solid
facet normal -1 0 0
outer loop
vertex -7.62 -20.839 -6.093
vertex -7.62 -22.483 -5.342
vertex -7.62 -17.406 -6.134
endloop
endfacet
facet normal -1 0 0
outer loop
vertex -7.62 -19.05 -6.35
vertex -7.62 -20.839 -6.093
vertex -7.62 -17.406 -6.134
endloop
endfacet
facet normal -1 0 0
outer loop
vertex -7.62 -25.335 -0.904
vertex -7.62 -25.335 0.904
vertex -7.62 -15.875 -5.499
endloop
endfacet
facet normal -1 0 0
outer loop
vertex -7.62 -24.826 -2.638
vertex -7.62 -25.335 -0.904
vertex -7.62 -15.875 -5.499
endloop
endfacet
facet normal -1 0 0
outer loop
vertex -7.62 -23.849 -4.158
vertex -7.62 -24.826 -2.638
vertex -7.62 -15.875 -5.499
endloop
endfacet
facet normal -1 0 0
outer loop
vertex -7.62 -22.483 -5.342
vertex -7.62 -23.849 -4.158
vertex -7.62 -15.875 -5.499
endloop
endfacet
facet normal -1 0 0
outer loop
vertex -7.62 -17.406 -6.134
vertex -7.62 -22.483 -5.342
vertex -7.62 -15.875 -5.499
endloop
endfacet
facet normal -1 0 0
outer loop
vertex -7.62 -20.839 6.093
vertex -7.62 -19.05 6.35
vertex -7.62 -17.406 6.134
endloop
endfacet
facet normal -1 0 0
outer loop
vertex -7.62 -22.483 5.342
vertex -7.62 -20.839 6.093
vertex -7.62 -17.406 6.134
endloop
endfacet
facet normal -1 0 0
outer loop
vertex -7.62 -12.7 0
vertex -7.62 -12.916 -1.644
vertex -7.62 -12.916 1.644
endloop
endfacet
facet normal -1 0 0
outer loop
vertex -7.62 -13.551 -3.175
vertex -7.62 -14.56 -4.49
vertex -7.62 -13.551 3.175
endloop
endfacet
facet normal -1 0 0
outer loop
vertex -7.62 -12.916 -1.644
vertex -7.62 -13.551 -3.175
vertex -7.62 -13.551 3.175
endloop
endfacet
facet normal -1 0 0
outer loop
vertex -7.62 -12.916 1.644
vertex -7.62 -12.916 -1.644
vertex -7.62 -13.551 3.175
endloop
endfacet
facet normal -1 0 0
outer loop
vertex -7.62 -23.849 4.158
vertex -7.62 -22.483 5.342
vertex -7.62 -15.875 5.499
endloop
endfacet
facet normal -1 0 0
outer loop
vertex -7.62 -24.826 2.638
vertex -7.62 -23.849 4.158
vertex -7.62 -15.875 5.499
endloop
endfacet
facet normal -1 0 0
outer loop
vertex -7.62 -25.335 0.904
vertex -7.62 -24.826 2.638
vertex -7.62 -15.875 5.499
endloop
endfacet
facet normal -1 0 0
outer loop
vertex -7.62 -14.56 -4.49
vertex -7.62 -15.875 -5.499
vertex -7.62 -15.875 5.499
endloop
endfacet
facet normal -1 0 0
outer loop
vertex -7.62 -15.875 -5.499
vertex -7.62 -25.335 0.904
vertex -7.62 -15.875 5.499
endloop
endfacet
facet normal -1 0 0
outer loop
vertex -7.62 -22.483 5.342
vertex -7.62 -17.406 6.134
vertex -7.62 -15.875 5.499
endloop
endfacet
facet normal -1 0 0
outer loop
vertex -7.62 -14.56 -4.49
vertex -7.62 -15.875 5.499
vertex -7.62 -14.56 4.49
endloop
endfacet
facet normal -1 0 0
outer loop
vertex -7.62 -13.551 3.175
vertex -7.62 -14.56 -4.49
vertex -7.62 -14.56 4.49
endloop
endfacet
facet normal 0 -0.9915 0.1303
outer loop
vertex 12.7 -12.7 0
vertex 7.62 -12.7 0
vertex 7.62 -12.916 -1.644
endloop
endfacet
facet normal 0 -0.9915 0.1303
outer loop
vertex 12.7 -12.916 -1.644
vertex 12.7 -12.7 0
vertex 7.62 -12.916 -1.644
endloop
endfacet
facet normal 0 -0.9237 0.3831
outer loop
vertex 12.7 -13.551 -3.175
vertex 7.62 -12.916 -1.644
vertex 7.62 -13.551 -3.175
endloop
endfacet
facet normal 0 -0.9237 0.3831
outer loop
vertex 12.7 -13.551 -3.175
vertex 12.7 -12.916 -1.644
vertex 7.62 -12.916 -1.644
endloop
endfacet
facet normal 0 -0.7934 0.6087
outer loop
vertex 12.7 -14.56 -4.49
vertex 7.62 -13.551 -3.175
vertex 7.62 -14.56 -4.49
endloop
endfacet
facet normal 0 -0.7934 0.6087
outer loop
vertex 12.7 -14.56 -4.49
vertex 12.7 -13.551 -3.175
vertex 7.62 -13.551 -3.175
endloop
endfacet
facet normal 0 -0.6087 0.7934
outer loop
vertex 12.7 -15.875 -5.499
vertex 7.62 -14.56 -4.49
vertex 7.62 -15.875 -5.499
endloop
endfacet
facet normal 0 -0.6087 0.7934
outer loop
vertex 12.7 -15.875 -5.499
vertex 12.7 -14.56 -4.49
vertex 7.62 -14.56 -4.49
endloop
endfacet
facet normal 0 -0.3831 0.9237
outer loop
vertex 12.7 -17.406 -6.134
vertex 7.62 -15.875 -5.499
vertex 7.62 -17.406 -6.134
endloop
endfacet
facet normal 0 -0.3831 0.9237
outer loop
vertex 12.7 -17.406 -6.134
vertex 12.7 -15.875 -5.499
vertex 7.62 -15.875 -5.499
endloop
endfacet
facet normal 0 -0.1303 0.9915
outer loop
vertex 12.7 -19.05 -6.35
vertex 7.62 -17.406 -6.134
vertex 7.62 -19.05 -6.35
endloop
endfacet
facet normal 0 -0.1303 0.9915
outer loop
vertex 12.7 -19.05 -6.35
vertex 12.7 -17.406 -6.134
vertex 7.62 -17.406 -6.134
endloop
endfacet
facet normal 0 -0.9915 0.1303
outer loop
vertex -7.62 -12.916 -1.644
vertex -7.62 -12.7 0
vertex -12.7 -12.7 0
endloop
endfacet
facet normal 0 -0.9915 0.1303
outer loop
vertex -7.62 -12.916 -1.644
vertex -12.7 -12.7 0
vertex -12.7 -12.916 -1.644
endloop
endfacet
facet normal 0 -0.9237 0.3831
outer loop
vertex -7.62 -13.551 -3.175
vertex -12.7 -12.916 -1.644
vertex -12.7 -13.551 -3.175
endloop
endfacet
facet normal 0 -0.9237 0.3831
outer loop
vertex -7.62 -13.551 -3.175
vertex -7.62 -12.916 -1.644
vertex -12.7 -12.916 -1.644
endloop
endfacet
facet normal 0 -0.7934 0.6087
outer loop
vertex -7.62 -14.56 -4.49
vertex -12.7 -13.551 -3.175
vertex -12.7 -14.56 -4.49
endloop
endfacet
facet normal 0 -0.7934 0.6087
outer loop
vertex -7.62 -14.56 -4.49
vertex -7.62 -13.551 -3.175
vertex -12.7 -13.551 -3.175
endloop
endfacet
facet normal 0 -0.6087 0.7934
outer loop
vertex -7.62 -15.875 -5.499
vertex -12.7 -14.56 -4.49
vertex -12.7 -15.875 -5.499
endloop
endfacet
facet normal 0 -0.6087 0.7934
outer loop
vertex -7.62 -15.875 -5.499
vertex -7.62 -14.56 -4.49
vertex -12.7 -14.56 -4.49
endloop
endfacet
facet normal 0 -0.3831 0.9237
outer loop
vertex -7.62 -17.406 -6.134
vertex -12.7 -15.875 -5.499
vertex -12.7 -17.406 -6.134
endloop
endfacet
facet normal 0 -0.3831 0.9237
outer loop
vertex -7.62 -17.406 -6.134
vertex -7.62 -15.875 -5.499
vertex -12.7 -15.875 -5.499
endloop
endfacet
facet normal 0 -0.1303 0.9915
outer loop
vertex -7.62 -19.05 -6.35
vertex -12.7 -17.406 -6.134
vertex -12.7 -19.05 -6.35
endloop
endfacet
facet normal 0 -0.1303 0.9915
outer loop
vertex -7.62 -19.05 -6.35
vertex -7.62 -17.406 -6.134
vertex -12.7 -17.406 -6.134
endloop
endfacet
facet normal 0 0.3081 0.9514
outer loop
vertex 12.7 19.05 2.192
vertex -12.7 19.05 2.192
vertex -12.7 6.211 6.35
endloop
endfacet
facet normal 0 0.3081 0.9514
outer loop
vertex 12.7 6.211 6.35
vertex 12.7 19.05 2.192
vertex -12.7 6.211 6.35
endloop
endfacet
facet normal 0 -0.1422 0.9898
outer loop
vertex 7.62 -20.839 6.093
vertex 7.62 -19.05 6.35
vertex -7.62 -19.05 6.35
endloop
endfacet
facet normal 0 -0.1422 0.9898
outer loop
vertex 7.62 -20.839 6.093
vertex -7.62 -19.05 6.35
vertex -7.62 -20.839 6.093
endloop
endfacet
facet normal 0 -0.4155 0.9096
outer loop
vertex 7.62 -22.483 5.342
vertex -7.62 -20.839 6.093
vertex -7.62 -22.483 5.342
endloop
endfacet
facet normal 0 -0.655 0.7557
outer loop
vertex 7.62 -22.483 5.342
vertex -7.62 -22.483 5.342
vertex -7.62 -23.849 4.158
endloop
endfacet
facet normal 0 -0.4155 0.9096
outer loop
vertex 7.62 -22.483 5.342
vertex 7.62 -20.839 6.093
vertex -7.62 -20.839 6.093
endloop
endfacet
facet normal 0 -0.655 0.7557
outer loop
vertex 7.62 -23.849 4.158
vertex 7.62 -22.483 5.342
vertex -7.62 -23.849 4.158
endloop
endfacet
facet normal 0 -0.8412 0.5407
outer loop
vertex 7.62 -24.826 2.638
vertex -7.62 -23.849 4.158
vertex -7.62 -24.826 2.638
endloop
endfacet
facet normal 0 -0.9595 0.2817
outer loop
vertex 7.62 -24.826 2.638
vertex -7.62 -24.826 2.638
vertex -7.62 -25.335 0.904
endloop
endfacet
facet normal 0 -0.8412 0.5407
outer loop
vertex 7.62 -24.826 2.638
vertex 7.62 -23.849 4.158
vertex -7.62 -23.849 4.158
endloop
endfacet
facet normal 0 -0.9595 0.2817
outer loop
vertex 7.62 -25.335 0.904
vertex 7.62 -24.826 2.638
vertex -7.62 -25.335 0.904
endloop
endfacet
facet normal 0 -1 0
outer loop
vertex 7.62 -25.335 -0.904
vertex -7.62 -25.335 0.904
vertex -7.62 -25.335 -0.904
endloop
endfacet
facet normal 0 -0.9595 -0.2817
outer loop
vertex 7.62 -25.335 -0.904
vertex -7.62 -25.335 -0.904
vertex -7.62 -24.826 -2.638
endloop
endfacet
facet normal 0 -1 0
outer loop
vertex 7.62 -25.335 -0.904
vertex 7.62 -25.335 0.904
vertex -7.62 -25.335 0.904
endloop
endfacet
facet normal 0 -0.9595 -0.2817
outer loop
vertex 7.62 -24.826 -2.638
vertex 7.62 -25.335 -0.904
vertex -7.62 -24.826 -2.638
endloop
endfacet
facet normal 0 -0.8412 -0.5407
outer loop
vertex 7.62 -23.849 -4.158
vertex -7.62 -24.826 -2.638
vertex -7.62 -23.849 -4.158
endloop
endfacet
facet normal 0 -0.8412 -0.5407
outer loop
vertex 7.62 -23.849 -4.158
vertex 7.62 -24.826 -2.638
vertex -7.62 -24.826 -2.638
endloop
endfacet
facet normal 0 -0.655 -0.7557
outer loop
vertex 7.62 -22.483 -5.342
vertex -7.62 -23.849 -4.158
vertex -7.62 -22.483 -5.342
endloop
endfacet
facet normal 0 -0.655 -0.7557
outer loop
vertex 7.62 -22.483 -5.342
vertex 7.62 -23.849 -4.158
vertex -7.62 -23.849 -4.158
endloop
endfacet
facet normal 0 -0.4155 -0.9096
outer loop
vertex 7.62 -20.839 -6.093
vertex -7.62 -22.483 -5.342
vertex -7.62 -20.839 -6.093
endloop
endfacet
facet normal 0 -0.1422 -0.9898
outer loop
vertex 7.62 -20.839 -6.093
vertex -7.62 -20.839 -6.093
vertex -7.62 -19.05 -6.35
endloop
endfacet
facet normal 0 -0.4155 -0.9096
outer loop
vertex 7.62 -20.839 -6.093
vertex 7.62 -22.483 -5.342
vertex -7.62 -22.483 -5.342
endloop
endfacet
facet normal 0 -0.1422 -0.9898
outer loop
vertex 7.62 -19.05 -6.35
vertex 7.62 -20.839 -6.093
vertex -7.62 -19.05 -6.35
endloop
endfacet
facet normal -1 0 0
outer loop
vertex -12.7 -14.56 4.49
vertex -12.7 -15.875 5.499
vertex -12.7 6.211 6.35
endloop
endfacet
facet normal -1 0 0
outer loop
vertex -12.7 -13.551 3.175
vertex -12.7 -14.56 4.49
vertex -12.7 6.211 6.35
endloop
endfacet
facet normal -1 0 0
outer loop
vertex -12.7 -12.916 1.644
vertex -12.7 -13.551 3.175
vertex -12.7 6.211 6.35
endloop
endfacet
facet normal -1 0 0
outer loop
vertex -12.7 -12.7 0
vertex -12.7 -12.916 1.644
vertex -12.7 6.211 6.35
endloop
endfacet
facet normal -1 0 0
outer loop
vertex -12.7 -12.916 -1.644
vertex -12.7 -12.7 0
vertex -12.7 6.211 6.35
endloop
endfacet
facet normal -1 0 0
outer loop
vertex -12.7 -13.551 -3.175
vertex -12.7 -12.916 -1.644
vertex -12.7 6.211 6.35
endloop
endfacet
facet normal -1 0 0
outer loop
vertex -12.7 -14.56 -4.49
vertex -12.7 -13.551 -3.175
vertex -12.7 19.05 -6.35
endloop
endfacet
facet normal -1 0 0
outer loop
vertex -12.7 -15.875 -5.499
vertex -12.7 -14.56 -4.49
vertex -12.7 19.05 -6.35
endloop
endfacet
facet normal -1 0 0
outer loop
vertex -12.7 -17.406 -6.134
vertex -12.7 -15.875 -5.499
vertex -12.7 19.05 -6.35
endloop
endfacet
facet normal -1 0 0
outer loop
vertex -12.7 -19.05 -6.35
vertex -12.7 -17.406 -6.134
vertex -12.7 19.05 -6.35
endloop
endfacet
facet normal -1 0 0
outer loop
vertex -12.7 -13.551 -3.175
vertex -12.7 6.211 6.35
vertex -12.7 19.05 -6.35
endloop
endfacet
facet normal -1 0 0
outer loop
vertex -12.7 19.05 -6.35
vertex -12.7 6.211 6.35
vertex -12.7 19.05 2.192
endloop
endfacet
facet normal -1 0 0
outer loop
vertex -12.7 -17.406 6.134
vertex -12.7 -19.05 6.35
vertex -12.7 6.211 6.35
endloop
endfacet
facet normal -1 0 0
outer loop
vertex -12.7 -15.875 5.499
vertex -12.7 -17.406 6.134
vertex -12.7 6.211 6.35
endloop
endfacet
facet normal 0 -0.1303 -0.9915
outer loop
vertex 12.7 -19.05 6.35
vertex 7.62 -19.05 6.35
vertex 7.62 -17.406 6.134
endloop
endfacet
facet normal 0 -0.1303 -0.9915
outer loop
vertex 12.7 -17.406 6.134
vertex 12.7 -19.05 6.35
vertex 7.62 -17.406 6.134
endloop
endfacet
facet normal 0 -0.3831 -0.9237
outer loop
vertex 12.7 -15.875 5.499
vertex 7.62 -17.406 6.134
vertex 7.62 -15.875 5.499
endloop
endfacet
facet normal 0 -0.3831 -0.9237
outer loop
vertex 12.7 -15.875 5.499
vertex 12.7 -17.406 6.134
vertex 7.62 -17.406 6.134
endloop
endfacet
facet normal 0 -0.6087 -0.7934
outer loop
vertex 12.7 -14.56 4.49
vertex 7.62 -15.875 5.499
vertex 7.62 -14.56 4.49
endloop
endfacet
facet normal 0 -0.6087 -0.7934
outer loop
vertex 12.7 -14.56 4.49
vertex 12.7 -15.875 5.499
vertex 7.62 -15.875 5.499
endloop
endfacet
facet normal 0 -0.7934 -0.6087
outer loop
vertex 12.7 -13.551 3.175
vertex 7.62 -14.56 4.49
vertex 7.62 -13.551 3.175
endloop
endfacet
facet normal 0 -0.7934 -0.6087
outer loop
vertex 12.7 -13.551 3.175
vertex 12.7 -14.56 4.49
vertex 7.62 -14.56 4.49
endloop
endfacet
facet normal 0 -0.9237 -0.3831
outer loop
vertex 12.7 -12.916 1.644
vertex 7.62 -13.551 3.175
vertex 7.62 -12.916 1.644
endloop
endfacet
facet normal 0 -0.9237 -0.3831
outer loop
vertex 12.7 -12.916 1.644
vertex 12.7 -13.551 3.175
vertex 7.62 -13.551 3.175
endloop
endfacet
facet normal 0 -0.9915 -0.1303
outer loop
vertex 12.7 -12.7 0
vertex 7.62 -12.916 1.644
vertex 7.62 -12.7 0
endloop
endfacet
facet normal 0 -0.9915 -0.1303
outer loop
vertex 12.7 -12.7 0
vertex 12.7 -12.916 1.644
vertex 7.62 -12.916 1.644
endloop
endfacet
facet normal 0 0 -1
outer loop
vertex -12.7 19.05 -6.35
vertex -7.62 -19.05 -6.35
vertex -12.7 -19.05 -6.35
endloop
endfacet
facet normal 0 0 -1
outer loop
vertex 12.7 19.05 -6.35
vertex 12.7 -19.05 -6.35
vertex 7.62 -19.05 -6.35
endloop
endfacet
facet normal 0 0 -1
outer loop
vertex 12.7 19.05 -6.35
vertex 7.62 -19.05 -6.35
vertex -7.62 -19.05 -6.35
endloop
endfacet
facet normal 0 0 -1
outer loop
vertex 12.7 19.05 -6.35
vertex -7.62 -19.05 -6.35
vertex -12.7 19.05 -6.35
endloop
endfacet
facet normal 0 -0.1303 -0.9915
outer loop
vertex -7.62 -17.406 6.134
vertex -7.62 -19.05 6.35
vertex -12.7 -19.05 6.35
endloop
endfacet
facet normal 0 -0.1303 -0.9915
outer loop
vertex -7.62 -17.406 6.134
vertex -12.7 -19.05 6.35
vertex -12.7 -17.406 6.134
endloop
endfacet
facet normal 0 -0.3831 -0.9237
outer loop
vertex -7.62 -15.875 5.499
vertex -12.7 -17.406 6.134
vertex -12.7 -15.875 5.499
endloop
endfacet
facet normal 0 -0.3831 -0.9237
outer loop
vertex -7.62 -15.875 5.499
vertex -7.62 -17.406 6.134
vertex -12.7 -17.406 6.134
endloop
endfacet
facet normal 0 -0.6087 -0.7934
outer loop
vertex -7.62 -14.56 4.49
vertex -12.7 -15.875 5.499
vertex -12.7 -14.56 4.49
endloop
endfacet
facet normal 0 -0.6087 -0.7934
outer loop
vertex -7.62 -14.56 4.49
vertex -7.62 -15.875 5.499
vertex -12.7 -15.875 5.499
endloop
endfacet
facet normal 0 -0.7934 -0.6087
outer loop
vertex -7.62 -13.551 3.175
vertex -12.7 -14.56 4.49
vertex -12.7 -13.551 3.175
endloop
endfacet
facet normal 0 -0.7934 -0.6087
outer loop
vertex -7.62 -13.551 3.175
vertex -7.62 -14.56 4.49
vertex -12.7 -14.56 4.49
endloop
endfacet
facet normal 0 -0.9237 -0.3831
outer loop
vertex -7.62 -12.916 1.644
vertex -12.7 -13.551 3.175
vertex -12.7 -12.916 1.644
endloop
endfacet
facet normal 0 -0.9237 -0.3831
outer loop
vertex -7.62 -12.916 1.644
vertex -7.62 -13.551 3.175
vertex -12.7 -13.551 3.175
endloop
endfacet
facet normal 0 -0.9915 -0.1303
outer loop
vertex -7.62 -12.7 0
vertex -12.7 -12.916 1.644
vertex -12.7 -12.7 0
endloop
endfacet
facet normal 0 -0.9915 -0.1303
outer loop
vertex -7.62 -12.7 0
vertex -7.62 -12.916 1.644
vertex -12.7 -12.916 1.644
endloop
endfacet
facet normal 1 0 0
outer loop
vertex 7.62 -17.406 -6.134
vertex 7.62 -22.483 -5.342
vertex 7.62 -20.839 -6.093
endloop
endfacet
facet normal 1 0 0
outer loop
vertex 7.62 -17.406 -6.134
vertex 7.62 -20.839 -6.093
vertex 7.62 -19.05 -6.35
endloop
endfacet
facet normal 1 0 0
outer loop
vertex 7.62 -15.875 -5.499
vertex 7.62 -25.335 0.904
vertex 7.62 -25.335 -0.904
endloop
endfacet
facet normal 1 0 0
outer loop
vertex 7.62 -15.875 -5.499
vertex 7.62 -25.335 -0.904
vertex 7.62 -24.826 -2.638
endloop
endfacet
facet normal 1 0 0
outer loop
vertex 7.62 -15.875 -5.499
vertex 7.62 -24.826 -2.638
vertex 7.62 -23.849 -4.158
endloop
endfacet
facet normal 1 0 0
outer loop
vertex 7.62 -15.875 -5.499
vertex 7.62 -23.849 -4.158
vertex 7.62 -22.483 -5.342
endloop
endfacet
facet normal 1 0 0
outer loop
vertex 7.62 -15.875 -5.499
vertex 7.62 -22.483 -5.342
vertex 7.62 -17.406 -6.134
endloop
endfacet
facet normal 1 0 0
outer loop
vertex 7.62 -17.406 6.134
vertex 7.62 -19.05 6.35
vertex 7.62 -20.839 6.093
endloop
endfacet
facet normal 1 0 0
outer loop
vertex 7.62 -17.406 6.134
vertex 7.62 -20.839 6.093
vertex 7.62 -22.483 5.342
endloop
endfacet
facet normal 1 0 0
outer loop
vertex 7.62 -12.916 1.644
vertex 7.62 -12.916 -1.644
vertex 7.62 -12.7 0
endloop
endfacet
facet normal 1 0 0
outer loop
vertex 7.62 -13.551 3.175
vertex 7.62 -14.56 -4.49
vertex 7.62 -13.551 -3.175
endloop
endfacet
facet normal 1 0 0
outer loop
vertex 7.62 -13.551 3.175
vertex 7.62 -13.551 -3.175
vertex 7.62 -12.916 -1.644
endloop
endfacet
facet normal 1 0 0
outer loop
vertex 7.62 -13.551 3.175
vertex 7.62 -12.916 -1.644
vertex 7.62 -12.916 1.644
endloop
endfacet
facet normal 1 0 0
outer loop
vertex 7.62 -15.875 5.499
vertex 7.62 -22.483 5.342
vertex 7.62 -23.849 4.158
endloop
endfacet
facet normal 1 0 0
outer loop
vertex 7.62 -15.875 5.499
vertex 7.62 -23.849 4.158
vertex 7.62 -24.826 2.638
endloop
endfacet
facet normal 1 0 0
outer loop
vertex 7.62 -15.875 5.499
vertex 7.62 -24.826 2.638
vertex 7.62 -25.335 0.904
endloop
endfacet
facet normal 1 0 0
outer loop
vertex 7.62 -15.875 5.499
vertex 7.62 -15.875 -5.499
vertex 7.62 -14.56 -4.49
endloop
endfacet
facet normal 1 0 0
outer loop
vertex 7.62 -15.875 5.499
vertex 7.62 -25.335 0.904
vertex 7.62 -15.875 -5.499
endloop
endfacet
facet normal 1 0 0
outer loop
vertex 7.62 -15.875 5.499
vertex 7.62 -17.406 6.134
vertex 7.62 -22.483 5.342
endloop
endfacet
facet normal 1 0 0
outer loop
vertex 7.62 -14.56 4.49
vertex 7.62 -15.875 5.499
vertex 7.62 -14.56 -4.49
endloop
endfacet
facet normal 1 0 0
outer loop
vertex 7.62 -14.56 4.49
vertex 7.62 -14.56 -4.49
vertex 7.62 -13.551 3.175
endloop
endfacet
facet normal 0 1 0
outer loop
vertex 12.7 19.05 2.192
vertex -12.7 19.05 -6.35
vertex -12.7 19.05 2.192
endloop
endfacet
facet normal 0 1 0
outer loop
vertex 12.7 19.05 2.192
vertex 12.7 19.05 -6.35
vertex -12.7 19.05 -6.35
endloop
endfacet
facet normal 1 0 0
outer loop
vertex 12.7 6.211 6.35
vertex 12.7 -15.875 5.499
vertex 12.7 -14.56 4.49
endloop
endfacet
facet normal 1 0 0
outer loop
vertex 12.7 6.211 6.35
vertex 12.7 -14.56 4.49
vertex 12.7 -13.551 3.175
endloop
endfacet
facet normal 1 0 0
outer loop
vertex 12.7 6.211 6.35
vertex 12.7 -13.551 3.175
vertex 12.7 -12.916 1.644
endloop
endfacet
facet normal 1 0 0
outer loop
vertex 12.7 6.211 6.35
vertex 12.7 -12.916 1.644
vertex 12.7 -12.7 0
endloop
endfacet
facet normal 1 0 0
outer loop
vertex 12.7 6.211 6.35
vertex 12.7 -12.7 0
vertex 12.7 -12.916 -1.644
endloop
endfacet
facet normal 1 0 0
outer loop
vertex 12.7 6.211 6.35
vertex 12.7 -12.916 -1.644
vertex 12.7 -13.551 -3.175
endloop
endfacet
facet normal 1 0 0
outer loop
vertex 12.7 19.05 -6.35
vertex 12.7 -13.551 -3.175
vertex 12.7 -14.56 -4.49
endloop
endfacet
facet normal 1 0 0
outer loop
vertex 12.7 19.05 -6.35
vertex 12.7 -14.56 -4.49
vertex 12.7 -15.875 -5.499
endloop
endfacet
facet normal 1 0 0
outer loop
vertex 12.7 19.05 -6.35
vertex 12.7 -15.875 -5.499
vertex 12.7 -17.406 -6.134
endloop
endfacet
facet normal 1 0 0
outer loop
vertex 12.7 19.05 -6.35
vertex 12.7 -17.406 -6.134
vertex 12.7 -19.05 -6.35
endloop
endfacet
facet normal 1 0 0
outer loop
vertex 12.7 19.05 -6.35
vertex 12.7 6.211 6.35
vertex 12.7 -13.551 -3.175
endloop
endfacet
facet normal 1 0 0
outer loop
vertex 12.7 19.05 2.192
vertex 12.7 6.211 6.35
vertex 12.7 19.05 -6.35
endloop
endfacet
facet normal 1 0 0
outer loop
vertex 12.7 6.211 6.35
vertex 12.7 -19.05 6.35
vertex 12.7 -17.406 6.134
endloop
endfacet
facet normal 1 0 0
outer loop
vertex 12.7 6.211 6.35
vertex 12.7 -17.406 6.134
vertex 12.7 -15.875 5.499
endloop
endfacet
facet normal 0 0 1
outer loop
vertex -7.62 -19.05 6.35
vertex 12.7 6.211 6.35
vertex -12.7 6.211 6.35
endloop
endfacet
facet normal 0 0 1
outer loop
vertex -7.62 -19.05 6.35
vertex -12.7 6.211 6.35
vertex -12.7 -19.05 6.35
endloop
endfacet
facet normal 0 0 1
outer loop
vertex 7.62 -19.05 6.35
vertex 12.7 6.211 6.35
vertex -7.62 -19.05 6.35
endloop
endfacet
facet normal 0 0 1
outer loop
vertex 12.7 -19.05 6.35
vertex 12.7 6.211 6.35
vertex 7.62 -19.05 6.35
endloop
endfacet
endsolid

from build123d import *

# Parameters (mm, degrees)
F1_DEPTH = 12.7
F2_DEPTH = 7.62


with BuildPart() as f1:
    # F0 (on Right) → F1 (new body, symmetric)
    with BuildSketch(Plane.YZ):
        with BuildLine():
            Line((19.05, 2.192055), (6.210823, 6.35))
            Line((6.210823, 6.35), (-19.05, 6.35))
            ThreePointArc((-19.05, 6.35), (-14.559872, 4.490128), (-12.7, 0))
            ThreePointArc((-12.7, 0), (-14.559872, -4.490128), (-19.05, -6.35))
            Line((-19.05, -6.35), (10.473152, -6.35))
            Line((10.473152, -6.35), (19.05, -6.35))
            Line((19.05, -6.35), (19.05, 2.192055))
        make_face()
    extrude(amount=F1_DEPTH, both=True)

    # F0 (on Right) → F2 (join, symmetric)
    with BuildSketch(Plane.YZ):
        with BuildLine():
            ThreePointArc((-12.7, 0), (-14.559872, 4.490128), (-19.05, 6.35))
            Line((-19.05, 6.35), (-19.05, -6.35))
            ThreePointArc((-19.05, -6.35), (-14.559872, -4.490128), (-12.7, 0))
        make_face()
        with BuildLine():
            Line((-19.05, -6.35), (-19.05, 6.35))
            ThreePointArc((-19.05, 6.35), (-25.4, 0), (-19.05, -6.35))
        make_face()
    extrude(amount=F2_DEPTH, both=True)


solid = f1.part
